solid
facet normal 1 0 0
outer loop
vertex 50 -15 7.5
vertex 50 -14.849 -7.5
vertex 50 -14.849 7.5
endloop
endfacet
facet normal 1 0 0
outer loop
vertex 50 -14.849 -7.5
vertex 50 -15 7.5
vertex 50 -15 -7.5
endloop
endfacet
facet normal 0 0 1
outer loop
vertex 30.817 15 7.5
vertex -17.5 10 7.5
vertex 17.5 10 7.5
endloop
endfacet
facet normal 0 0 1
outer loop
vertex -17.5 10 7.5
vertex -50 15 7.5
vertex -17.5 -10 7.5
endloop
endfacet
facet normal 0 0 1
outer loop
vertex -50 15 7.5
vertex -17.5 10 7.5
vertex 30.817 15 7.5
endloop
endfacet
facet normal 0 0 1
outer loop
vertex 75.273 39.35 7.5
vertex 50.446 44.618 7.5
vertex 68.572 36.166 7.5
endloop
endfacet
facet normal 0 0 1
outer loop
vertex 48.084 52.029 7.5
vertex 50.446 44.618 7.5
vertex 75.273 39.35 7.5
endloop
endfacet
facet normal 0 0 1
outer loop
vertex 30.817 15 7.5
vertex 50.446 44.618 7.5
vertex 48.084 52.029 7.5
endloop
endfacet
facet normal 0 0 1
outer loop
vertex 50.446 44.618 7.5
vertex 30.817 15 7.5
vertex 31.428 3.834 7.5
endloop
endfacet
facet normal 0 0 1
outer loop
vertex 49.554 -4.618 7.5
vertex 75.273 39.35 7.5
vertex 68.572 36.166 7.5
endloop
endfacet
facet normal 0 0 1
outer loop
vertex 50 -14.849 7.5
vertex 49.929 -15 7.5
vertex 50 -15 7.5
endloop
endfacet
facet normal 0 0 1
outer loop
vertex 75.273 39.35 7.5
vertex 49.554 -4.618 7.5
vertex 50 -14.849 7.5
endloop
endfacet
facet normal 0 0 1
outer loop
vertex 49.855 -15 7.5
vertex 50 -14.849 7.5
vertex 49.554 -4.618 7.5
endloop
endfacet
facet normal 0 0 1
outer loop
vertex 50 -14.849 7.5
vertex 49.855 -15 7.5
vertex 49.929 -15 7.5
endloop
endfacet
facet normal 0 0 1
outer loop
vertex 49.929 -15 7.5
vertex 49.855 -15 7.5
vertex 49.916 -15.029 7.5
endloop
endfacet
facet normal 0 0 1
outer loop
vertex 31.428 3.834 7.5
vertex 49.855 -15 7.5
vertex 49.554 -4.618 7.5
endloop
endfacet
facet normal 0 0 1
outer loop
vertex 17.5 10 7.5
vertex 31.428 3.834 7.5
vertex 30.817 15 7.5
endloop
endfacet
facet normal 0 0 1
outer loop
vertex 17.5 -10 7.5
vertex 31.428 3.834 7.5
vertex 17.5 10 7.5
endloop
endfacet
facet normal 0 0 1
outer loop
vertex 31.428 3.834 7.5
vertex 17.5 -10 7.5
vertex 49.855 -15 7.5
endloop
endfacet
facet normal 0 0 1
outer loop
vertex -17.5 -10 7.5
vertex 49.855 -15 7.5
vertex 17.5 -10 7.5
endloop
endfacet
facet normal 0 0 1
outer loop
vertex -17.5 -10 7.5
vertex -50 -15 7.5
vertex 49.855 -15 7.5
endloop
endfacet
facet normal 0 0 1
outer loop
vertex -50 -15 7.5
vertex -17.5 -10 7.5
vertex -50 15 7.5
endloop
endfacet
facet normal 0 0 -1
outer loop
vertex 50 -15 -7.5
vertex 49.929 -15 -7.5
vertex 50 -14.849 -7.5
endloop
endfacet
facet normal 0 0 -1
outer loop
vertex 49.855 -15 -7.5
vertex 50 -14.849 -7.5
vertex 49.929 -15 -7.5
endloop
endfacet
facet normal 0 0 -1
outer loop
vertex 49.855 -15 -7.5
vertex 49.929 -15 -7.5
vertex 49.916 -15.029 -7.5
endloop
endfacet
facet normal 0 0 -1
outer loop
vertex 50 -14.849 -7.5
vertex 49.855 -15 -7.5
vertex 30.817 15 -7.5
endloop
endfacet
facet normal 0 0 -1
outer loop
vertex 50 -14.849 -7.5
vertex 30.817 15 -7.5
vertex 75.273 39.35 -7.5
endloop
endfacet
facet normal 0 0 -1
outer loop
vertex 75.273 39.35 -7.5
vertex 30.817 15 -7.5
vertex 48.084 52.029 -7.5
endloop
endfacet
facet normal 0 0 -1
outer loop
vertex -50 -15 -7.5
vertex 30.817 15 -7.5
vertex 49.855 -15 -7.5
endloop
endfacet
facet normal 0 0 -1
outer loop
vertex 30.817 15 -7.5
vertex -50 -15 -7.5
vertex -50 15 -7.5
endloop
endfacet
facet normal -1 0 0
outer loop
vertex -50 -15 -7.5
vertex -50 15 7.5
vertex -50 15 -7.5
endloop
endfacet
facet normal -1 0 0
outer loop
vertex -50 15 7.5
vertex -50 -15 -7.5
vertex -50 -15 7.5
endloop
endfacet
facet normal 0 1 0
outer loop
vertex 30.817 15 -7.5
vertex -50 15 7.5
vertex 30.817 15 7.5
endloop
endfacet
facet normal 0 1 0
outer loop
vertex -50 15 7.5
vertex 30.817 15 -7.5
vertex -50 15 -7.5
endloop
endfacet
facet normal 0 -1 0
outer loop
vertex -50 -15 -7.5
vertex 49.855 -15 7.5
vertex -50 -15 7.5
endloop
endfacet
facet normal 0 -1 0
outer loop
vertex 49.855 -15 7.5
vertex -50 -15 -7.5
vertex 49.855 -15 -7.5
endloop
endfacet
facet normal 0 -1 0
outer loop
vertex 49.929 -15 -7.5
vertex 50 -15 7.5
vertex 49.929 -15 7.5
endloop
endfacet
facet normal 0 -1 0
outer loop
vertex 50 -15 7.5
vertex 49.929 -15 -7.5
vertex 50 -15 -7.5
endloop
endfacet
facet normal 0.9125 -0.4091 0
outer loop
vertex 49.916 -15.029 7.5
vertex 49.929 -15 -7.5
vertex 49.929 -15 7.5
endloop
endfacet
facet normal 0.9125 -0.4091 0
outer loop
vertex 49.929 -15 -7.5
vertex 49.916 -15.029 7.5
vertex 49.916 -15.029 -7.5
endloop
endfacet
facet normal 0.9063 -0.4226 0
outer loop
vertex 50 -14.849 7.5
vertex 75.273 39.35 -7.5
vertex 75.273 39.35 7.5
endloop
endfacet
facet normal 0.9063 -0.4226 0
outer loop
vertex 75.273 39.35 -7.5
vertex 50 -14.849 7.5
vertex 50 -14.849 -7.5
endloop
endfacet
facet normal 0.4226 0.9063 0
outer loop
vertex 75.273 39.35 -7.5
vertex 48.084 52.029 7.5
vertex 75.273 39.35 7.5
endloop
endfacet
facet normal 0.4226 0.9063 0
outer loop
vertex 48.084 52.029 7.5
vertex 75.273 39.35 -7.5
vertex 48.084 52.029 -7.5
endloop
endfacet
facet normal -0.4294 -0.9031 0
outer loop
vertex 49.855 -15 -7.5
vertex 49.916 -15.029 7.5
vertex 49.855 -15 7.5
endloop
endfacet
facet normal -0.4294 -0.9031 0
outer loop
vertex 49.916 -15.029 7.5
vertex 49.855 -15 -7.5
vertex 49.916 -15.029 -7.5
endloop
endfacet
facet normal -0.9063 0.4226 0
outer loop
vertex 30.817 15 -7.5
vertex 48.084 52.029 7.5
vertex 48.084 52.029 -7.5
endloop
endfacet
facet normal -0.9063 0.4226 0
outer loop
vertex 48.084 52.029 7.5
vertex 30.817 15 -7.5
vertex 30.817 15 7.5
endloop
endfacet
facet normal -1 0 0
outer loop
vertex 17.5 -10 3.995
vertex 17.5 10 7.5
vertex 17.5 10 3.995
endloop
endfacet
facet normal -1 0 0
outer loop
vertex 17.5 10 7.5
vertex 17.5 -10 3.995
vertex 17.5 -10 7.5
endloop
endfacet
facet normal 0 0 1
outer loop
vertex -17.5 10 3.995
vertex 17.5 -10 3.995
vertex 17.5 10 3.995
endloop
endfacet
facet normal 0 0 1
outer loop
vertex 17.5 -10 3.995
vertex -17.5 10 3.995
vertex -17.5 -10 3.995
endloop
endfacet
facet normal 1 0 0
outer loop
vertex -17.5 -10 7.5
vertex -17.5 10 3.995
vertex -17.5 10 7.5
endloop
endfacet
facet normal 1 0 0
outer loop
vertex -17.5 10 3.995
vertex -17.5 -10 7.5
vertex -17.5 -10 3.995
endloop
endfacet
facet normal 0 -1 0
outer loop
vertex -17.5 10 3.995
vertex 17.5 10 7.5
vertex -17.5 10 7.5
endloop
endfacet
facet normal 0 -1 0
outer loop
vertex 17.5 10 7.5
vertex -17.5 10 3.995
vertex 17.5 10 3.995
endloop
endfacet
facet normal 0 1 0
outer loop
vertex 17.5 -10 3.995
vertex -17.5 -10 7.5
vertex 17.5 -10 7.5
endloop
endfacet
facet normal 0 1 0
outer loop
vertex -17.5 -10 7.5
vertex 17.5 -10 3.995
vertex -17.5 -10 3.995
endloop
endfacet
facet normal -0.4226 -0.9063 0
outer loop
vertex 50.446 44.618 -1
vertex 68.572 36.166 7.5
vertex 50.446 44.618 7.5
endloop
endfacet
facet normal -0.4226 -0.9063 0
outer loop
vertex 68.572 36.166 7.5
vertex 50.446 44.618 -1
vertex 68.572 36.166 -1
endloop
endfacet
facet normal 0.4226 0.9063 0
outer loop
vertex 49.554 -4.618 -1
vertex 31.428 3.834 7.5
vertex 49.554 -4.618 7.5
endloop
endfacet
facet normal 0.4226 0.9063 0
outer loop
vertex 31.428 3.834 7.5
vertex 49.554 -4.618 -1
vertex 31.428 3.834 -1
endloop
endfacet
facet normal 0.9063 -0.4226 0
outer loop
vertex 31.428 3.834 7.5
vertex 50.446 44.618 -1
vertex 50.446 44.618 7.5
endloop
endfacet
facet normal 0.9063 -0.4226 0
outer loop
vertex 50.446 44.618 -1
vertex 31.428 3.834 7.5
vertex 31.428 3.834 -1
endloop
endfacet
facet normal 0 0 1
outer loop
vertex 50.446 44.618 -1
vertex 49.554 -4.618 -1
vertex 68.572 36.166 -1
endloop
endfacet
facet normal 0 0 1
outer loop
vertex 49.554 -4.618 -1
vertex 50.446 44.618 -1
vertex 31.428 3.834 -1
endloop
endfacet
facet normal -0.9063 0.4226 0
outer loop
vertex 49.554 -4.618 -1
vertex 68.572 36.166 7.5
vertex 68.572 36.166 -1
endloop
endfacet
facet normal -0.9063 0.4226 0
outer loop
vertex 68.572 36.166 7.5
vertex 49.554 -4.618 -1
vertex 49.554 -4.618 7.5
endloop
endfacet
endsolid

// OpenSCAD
//GunPieceBottom();
//boardCutout();


difference(){
        GunPieceBottom();
        #boardCutout();
        #batteryCutOut();
}

module GunPieceBottom(){
    solidBlock([100, 30, 15]);
    translate([49,18.5,0]){
        //handle piece
        rotate([0, 0, 155]){
            solidBlock([30, 60, 15]);
        }
    }
    
}

module boardCutout(){
    translate([0, 0, 6]){
        solidBlock([35, 20, 4 + 0.01]);
    }
}  

module batteryCutOut(){
    translate([50, 20, 4]){
        rotate([0, 0, 65]){
            solidBlock([45, 20, 10]);
        }
    }
}

module solidBlock(dimensions){
    translate([0, 0, dimensions[2]/2]);
        cube(dimensions, true);
}
